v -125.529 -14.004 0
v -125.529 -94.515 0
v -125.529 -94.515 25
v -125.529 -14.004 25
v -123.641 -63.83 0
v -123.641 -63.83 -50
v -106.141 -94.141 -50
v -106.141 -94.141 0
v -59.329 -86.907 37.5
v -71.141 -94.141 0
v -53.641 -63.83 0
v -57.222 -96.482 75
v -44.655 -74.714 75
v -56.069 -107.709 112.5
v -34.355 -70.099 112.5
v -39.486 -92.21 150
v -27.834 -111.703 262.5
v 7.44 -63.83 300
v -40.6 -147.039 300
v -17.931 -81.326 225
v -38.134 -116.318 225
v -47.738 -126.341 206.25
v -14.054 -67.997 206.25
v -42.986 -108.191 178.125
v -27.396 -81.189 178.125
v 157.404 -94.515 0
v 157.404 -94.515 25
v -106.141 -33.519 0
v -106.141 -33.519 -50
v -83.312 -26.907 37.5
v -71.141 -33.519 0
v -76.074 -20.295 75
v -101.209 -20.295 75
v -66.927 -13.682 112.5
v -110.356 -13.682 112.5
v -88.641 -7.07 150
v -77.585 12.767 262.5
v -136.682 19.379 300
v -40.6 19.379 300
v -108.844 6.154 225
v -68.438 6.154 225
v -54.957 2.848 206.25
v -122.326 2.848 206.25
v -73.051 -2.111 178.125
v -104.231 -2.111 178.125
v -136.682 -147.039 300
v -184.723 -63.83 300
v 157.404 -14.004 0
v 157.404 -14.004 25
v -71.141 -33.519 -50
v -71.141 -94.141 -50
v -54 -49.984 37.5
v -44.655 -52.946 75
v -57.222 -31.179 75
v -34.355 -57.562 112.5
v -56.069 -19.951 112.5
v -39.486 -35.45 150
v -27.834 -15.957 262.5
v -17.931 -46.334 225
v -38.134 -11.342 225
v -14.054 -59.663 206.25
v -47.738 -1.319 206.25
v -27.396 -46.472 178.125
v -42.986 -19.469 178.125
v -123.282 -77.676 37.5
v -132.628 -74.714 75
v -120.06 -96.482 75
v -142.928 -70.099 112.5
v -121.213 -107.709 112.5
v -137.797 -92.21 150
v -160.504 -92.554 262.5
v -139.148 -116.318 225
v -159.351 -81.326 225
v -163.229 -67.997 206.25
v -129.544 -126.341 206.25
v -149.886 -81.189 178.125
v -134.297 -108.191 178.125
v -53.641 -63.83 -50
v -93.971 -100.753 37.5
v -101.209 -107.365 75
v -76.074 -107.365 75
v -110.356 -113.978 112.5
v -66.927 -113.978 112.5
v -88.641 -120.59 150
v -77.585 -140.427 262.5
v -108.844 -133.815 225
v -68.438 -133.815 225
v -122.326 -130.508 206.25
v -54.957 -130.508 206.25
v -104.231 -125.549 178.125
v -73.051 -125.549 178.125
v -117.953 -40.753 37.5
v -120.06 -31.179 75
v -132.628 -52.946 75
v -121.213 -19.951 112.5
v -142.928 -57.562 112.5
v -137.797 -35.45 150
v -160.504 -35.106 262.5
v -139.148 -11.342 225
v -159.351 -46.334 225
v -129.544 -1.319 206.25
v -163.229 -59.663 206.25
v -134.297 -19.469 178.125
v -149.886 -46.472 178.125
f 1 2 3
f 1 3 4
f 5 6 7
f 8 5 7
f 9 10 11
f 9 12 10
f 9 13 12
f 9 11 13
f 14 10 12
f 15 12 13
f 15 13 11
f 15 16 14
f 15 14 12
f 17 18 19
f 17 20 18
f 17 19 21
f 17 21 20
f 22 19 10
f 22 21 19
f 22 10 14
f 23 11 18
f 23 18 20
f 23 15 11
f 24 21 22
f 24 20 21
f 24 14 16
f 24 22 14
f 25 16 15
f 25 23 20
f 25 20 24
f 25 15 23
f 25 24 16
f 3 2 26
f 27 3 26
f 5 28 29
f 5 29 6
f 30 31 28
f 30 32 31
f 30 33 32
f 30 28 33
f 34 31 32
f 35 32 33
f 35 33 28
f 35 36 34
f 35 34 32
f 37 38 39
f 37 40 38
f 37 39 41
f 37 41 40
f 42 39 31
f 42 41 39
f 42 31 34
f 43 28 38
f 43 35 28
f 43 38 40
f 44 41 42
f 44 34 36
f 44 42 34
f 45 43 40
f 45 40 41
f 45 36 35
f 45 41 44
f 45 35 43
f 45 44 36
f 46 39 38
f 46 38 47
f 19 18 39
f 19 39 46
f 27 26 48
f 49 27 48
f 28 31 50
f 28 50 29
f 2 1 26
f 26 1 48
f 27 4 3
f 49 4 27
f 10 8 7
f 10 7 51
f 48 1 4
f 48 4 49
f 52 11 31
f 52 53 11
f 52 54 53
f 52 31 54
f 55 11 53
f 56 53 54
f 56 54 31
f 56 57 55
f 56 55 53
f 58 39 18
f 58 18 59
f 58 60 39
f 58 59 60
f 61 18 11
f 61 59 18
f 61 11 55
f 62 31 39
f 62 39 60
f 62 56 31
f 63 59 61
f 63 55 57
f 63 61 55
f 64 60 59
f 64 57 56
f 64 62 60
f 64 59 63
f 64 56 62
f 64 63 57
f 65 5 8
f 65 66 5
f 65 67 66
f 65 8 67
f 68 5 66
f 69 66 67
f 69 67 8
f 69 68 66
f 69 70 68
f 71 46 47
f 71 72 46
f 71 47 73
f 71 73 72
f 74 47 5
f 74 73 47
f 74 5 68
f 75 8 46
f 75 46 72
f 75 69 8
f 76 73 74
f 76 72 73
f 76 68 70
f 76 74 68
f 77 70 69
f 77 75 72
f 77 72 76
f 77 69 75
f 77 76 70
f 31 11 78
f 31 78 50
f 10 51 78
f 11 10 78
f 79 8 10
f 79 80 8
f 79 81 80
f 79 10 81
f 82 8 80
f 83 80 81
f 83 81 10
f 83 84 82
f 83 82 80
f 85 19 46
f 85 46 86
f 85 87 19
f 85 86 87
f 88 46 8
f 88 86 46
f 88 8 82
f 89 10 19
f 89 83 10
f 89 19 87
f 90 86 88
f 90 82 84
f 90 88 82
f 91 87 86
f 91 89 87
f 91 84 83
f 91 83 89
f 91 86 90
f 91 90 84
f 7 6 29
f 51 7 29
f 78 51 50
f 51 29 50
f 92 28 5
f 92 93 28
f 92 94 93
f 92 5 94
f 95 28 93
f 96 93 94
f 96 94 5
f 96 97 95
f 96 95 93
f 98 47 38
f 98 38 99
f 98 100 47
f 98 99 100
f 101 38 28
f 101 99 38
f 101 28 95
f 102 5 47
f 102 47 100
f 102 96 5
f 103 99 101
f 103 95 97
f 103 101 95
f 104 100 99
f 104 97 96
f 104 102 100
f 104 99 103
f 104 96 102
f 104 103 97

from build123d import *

# Parameters (mm, degrees)
F1_DEPTH      = 300
F1_TAPER      = -10
F1_DEPTH_BACK = 50
F2_W          = 282.932549715
F2_H          = 80.5106787011
F3_DEPTH      = 25


with BuildPart() as f1:
    # F0 (on Top) → F1 (new body, two sides)
    with BuildSketch(Plane.XY) as f1_sk:
        Polygon((-71.1411711854, -33.5191795008), (-106.1411711854, -33.5191795008), (-123.6411711854, -63.8300686332), (-106.1411711854, -94.1409577657), (-71.1411711854, -94.1409577657), (-53.6411711854, -63.8300686332), align=None)
    extrude(amount=F1_DEPTH, taper=F1_TAPER)
    extrude(f1_sk.sketch, amount=-F1_DEPTH_BACK)


with BuildPart() as f3:
    # F2 (on Top) → F3 (new body)
    with BuildSketch(Plane.XY):
        with Locations((15.9373134375, -54.2593435384)):
            Rectangle(F2_W, F2_H)
    extrude(amount=F3_DEPTH)


solid = Compound([f1.part, f3.part])
